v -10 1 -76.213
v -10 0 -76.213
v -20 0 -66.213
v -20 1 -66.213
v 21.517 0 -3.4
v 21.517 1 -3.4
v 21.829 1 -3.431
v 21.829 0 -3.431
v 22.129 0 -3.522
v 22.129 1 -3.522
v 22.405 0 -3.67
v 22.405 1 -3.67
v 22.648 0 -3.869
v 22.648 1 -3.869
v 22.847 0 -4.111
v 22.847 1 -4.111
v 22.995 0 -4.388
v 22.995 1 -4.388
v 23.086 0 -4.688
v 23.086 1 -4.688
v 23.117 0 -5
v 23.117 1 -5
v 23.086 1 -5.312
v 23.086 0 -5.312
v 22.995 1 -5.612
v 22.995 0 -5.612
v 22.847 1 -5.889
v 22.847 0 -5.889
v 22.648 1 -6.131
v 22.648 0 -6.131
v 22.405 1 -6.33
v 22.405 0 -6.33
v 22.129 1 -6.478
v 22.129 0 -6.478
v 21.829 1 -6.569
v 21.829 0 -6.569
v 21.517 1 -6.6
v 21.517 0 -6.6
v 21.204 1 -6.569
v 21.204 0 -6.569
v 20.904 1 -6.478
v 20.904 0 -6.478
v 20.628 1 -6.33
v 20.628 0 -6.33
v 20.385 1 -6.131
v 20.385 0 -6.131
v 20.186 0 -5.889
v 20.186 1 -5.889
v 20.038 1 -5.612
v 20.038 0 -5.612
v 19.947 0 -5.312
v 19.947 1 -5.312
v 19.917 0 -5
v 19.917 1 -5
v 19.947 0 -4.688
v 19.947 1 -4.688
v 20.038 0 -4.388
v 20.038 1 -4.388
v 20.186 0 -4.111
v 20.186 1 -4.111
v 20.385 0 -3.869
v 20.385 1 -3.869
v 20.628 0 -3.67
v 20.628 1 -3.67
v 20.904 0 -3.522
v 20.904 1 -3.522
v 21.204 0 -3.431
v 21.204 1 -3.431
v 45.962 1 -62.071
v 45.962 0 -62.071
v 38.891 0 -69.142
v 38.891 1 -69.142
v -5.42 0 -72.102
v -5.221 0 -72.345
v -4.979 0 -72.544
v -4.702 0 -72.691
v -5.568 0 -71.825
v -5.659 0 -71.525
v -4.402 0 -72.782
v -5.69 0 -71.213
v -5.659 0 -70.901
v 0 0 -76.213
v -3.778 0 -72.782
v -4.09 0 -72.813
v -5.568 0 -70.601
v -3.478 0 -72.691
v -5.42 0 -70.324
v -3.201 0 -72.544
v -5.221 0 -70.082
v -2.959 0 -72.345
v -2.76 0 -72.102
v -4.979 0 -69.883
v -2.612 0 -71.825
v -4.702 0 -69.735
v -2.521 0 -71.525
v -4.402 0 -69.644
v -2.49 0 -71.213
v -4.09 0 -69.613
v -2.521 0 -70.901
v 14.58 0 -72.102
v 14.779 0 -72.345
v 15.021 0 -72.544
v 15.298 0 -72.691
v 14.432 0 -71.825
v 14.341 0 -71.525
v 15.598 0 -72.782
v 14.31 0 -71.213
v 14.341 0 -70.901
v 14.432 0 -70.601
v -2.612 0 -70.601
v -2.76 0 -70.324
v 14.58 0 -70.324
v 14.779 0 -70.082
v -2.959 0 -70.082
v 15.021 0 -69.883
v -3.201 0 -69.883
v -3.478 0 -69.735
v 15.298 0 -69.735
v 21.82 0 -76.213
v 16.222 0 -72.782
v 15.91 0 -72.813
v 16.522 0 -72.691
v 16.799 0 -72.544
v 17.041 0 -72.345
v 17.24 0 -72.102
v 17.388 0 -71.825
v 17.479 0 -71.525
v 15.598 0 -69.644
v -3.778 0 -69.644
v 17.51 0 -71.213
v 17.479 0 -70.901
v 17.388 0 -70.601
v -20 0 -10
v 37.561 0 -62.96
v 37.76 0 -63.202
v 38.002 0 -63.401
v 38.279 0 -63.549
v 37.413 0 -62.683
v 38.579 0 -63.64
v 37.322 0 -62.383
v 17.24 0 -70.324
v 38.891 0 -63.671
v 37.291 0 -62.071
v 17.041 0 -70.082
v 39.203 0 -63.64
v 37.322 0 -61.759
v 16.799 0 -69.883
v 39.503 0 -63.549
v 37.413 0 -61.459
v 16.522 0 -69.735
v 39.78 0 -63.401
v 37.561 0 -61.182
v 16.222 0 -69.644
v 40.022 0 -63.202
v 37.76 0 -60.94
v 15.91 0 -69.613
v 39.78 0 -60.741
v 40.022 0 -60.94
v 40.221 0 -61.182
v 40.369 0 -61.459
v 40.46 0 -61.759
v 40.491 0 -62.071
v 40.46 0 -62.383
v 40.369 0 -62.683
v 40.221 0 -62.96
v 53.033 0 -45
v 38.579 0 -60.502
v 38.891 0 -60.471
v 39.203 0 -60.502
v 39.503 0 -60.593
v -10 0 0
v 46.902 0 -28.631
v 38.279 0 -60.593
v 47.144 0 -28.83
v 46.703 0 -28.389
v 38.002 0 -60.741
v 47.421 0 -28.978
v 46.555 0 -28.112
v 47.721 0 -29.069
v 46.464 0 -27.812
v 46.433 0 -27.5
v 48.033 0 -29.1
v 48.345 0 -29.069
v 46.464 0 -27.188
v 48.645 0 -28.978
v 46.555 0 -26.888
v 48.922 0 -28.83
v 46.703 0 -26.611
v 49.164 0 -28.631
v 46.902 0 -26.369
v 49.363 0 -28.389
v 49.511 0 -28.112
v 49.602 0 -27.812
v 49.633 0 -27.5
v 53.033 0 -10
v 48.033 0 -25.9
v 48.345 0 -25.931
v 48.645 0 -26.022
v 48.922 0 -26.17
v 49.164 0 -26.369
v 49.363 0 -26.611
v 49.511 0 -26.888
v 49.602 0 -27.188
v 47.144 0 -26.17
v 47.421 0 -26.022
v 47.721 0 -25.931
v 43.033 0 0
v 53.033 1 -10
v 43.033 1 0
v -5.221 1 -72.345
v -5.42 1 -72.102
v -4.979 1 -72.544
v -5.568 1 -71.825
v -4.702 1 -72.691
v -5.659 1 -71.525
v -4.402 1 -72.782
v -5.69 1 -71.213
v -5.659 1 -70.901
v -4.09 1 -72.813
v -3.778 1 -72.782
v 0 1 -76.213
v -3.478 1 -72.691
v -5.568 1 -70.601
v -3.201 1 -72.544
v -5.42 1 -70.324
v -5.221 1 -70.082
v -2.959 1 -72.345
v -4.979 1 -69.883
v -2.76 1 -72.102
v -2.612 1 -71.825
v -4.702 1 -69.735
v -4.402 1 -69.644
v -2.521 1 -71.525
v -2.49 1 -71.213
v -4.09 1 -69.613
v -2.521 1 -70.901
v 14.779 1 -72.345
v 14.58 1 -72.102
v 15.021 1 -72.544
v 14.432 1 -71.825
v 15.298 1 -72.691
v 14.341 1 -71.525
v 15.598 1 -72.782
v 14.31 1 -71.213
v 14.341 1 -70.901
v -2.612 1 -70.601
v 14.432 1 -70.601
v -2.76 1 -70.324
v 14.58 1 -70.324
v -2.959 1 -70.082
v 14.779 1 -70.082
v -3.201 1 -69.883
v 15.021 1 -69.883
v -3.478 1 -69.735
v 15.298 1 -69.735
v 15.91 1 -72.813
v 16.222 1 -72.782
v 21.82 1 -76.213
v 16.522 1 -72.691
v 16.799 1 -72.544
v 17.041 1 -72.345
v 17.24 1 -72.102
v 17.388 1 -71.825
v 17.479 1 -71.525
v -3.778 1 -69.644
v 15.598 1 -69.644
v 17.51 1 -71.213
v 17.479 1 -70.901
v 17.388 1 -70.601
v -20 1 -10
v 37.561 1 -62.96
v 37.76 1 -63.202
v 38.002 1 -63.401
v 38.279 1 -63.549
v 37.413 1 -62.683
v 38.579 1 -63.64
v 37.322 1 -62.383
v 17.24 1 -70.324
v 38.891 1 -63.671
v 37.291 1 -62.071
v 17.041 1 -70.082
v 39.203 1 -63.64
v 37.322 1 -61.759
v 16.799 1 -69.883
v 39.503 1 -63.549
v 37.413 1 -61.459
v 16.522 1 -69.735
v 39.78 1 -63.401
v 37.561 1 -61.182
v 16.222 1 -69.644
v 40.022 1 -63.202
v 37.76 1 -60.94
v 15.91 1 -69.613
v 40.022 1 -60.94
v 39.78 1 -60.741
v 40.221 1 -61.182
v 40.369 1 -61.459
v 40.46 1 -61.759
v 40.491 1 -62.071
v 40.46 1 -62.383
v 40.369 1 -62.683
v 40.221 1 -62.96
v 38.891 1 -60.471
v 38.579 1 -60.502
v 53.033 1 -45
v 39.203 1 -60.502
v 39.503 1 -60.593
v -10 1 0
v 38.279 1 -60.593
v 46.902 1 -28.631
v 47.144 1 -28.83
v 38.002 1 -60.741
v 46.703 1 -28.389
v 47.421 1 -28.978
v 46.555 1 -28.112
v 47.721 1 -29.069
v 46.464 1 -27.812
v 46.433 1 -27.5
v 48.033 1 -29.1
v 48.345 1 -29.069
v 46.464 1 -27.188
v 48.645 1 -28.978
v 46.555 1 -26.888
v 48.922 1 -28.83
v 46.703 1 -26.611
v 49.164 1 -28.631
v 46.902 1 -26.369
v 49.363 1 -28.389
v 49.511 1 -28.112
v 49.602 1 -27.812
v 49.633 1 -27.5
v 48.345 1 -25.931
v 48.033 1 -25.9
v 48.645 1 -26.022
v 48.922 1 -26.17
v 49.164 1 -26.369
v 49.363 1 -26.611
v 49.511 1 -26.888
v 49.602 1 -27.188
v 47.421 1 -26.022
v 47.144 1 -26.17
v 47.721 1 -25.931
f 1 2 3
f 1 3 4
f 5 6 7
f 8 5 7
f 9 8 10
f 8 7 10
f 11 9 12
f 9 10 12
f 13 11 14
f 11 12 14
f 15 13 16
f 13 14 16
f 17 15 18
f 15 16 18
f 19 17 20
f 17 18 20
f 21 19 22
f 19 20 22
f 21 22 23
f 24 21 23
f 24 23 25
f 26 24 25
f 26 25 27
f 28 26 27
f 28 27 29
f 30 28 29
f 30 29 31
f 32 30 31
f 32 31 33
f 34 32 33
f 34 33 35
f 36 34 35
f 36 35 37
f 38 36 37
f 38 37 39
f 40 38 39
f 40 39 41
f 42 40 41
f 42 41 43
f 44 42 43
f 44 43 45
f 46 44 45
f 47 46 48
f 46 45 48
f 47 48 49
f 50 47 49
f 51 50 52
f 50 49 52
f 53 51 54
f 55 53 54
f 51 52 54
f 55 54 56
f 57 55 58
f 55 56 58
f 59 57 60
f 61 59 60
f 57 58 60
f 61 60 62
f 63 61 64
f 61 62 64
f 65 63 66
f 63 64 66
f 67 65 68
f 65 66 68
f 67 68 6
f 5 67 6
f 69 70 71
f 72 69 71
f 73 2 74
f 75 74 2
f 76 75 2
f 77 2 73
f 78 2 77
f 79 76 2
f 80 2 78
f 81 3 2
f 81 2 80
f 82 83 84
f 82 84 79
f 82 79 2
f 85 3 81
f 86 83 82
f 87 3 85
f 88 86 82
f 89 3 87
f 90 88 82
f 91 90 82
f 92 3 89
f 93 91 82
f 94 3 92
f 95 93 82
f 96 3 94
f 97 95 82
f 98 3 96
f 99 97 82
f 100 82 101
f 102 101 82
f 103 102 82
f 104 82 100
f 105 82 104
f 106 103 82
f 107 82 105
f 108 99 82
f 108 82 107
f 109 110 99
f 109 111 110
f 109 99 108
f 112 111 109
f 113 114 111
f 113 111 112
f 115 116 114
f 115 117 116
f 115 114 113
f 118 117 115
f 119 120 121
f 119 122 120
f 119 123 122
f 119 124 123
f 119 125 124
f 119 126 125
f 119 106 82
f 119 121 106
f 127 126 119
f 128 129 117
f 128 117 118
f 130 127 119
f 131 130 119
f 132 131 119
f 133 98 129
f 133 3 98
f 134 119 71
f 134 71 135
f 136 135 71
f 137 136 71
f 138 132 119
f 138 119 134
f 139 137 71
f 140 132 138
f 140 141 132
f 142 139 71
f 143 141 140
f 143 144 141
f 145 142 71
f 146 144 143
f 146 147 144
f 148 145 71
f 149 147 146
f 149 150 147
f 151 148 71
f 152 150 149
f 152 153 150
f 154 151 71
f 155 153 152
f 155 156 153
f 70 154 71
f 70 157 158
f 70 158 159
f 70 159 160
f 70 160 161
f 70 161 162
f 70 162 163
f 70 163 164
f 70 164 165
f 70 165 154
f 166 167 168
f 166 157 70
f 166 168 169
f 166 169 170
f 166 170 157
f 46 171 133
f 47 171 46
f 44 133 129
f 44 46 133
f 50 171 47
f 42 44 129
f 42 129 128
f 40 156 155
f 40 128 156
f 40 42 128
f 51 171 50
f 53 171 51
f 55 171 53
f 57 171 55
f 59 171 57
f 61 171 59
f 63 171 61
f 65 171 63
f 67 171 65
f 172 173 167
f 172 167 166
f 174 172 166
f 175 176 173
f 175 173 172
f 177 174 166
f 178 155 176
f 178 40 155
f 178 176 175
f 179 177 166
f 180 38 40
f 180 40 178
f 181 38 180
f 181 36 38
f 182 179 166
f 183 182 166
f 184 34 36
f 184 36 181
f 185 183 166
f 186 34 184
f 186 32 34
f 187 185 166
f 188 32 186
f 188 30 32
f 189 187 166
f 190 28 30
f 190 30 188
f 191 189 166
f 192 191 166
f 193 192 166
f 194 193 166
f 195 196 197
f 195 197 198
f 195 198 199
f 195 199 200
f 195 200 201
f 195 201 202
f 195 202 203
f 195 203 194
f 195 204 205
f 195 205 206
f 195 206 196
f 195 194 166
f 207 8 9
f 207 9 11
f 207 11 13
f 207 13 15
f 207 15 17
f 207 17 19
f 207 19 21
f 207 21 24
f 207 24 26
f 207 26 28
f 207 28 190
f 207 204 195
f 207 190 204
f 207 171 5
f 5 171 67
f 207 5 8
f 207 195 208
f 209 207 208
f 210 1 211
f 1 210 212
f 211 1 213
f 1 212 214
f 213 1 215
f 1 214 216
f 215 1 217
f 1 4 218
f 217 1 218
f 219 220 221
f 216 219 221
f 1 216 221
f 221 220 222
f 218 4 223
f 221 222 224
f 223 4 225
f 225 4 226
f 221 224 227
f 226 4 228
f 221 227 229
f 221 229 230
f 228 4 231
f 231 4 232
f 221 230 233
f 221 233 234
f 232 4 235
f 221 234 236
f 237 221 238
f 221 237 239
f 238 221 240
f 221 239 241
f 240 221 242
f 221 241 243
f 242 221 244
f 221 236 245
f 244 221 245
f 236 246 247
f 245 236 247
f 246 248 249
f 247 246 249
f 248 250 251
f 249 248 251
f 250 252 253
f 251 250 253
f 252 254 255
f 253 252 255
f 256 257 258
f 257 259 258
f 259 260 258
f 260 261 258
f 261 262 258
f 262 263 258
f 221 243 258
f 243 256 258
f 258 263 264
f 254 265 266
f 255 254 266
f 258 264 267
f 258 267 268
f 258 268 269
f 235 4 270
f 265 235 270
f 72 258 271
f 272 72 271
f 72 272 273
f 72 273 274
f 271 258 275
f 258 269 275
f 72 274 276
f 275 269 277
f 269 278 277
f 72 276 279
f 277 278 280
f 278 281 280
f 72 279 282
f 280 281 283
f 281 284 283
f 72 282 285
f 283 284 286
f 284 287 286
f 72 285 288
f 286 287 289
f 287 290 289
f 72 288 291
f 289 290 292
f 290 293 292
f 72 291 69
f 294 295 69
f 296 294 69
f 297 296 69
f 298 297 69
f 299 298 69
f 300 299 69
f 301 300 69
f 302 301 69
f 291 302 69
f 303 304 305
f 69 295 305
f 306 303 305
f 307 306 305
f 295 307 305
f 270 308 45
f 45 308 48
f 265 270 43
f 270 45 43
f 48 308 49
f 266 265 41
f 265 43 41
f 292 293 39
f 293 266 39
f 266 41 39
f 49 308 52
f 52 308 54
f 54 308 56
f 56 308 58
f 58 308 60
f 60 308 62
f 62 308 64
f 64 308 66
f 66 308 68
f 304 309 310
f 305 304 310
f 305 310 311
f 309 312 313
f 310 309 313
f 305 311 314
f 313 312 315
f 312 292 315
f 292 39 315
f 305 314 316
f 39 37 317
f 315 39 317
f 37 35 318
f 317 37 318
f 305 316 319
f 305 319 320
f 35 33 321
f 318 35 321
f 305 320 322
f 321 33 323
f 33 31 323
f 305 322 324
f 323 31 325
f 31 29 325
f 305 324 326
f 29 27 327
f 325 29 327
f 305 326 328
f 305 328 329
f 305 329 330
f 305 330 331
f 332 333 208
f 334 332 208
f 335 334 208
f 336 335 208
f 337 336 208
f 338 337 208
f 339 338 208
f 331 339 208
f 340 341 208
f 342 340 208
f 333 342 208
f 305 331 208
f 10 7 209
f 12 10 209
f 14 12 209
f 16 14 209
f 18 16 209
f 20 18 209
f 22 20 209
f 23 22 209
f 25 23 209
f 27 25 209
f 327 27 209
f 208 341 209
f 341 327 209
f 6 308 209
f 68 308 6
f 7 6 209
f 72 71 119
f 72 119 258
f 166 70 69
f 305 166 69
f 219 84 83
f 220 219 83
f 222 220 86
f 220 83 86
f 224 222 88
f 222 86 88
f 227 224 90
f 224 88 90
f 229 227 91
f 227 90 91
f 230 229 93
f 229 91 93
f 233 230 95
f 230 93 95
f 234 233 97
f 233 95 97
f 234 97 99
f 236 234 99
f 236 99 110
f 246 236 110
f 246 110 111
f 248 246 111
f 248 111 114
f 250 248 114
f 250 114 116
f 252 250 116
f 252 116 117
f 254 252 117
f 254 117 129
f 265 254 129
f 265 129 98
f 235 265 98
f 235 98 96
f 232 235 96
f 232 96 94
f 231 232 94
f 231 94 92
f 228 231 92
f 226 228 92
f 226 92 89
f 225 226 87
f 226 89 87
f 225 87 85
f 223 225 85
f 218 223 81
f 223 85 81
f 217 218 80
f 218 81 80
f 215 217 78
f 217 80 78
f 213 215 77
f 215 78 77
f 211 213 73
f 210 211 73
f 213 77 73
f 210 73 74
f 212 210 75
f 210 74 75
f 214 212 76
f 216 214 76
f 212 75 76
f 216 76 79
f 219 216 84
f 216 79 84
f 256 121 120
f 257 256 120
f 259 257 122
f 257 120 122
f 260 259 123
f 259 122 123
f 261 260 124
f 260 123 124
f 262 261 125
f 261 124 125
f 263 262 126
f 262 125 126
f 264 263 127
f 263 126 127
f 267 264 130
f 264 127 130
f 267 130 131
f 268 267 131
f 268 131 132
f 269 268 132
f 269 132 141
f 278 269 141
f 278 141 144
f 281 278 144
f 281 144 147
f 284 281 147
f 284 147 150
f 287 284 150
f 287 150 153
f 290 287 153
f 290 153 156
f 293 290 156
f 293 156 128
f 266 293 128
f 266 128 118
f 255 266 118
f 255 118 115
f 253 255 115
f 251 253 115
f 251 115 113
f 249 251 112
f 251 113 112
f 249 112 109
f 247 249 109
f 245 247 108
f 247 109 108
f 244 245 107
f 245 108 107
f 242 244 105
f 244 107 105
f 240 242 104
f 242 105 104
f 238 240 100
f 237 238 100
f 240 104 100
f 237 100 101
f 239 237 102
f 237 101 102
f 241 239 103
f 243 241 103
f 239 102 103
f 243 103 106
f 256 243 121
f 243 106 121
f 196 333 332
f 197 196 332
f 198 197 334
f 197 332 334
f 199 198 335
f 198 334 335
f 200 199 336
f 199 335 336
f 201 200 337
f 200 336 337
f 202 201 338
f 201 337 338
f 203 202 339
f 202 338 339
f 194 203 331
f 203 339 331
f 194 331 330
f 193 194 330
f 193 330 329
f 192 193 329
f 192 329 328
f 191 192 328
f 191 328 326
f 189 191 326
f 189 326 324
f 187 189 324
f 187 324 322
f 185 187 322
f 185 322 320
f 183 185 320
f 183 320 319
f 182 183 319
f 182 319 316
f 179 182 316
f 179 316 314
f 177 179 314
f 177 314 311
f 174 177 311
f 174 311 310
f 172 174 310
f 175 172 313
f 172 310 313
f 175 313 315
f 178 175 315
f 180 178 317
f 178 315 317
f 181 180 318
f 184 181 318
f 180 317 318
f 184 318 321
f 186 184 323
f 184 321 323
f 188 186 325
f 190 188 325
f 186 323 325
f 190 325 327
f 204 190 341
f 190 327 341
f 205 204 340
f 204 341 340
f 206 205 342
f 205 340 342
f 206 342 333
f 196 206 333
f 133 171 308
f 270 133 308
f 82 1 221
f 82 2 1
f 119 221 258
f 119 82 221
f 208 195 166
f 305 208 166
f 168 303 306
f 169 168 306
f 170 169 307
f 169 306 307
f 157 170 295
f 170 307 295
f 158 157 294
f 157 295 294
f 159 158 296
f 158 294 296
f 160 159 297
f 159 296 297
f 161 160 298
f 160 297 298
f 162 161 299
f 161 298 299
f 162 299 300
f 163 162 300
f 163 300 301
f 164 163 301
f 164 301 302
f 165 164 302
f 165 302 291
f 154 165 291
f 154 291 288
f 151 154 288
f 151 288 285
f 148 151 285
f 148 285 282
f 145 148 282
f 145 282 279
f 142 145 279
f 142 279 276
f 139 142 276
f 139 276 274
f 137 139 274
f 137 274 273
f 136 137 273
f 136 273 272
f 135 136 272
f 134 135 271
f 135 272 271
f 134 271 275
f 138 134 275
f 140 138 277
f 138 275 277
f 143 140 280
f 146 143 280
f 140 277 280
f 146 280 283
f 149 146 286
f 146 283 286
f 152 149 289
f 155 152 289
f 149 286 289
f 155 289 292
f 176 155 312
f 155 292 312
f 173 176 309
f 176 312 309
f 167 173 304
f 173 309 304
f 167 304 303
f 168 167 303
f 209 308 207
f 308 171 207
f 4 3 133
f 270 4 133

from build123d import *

# Parameters (mm, degrees)
EXTRUDE_1_DEPTH     = 1
SKETCH_2_W          = 31.819805153
SKETCH_2_H          = 31.819805153
CUT_EXTRUDE_1_DEPTH = 10
CHAMFER_1_SIZE      = 10
SKETCH_4_R          = 1.6
CUT_EXTRUDE_3_DEPTH = 10
SKETCH_5_W          = 20
SKETCH_5_H          = 76.213203436
EXTRUDE_2_DEPTH     = 1
CHAMFER_2_SIZE      = 10
SKETCH_6_R          = 1.6
CUT_EXTRUDE_4_DEPTH = 10


with BuildPart() as part:
    # 草图1 → 凸台-拉伸1 (new body)
    with BuildSketch(Plane(origin=(0, 0, 0), x_dir=(1, 0, 0), z_dir=(0, 1, 0))):
        Polygon((0, 0), (53.033008589, 0), (53.033008589, 55), (0, 108.033008589), align=None)
    extrude(amount=EXTRUDE_1_DEPTH)

    # 草图2 → 切除-拉伸1 (cut)
    with BuildSketch(Plane.XZ):
        with Locations((15.909902577, -92.123106013)):
            Rectangle(SKETCH_2_W, SKETCH_2_H)
    extrude(amount=-CUT_EXTRUDE_1_DEPTH, mode=Mode.SUBTRACT)

    # 倒角1
    chamfer_1_edges = [part.edges().sort_by_distance(p)[0] for p in [
        (31.819805153, 0.5, -76.213203436),
        (53.033008589, 0.5, -55),
        (53.033008589, 0.5, 0),
    ]]
    chamfer(chamfer_1_edges, length=CHAMFER_1_SIZE)

    # 草图4 → 切除-拉伸3 (cut)
    with BuildSketch(Plane(origin=(0, 1, 0), x_dir=(1, 0, 0), z_dir=(0, 1, 0))):
        with Locations(Location((38.890872965, 62.071067812, 0), (0, 0, 270))):
            Circle(SKETCH_4_R)
        with Locations(Location((48.033008589, 27.5, 0), (0, 0, 270))):
            Circle(SKETCH_4_R)
        with Locations(Location((21.516504294, 5, 0), (0, 0, 270))):
            Circle(SKETCH_4_R)
    extrude(amount=-CUT_EXTRUDE_3_DEPTH, mode=Mode.SUBTRACT)

    # 草图5 → 凸台-拉伸2 (add)
    with BuildSketch(Plane.XZ):
        with Locations((-10, -38.106601718)):
            Rectangle(SKETCH_5_W, SKETCH_5_H)
    extrude(amount=-EXTRUDE_2_DEPTH)

    # 倒角2
    chamfer_2_edges = [part.edges().sort_by_distance(p)[0] for p in [
        (-20, 0.5, 0),
        (-20, 0.5, -76.213203436),
    ]]
    chamfer(chamfer_2_edges, length=CHAMFER_2_SIZE)

    # 草图6 → 切除-拉伸4 (cut)
    with BuildSketch(Plane.XZ):
        with Locations(Location((15.909902577, -71.213203436, 0), (0, 0, 270))):
            Circle(SKETCH_6_R)
        with Locations(Location((-4.090097423, -71.213203436, 0), (0, 0, 270))):
            Circle(SKETCH_6_R)
    extrude(amount=-CUT_EXTRUDE_4_DEPTH, mode=Mode.SUBTRACT)


solid = part.part
